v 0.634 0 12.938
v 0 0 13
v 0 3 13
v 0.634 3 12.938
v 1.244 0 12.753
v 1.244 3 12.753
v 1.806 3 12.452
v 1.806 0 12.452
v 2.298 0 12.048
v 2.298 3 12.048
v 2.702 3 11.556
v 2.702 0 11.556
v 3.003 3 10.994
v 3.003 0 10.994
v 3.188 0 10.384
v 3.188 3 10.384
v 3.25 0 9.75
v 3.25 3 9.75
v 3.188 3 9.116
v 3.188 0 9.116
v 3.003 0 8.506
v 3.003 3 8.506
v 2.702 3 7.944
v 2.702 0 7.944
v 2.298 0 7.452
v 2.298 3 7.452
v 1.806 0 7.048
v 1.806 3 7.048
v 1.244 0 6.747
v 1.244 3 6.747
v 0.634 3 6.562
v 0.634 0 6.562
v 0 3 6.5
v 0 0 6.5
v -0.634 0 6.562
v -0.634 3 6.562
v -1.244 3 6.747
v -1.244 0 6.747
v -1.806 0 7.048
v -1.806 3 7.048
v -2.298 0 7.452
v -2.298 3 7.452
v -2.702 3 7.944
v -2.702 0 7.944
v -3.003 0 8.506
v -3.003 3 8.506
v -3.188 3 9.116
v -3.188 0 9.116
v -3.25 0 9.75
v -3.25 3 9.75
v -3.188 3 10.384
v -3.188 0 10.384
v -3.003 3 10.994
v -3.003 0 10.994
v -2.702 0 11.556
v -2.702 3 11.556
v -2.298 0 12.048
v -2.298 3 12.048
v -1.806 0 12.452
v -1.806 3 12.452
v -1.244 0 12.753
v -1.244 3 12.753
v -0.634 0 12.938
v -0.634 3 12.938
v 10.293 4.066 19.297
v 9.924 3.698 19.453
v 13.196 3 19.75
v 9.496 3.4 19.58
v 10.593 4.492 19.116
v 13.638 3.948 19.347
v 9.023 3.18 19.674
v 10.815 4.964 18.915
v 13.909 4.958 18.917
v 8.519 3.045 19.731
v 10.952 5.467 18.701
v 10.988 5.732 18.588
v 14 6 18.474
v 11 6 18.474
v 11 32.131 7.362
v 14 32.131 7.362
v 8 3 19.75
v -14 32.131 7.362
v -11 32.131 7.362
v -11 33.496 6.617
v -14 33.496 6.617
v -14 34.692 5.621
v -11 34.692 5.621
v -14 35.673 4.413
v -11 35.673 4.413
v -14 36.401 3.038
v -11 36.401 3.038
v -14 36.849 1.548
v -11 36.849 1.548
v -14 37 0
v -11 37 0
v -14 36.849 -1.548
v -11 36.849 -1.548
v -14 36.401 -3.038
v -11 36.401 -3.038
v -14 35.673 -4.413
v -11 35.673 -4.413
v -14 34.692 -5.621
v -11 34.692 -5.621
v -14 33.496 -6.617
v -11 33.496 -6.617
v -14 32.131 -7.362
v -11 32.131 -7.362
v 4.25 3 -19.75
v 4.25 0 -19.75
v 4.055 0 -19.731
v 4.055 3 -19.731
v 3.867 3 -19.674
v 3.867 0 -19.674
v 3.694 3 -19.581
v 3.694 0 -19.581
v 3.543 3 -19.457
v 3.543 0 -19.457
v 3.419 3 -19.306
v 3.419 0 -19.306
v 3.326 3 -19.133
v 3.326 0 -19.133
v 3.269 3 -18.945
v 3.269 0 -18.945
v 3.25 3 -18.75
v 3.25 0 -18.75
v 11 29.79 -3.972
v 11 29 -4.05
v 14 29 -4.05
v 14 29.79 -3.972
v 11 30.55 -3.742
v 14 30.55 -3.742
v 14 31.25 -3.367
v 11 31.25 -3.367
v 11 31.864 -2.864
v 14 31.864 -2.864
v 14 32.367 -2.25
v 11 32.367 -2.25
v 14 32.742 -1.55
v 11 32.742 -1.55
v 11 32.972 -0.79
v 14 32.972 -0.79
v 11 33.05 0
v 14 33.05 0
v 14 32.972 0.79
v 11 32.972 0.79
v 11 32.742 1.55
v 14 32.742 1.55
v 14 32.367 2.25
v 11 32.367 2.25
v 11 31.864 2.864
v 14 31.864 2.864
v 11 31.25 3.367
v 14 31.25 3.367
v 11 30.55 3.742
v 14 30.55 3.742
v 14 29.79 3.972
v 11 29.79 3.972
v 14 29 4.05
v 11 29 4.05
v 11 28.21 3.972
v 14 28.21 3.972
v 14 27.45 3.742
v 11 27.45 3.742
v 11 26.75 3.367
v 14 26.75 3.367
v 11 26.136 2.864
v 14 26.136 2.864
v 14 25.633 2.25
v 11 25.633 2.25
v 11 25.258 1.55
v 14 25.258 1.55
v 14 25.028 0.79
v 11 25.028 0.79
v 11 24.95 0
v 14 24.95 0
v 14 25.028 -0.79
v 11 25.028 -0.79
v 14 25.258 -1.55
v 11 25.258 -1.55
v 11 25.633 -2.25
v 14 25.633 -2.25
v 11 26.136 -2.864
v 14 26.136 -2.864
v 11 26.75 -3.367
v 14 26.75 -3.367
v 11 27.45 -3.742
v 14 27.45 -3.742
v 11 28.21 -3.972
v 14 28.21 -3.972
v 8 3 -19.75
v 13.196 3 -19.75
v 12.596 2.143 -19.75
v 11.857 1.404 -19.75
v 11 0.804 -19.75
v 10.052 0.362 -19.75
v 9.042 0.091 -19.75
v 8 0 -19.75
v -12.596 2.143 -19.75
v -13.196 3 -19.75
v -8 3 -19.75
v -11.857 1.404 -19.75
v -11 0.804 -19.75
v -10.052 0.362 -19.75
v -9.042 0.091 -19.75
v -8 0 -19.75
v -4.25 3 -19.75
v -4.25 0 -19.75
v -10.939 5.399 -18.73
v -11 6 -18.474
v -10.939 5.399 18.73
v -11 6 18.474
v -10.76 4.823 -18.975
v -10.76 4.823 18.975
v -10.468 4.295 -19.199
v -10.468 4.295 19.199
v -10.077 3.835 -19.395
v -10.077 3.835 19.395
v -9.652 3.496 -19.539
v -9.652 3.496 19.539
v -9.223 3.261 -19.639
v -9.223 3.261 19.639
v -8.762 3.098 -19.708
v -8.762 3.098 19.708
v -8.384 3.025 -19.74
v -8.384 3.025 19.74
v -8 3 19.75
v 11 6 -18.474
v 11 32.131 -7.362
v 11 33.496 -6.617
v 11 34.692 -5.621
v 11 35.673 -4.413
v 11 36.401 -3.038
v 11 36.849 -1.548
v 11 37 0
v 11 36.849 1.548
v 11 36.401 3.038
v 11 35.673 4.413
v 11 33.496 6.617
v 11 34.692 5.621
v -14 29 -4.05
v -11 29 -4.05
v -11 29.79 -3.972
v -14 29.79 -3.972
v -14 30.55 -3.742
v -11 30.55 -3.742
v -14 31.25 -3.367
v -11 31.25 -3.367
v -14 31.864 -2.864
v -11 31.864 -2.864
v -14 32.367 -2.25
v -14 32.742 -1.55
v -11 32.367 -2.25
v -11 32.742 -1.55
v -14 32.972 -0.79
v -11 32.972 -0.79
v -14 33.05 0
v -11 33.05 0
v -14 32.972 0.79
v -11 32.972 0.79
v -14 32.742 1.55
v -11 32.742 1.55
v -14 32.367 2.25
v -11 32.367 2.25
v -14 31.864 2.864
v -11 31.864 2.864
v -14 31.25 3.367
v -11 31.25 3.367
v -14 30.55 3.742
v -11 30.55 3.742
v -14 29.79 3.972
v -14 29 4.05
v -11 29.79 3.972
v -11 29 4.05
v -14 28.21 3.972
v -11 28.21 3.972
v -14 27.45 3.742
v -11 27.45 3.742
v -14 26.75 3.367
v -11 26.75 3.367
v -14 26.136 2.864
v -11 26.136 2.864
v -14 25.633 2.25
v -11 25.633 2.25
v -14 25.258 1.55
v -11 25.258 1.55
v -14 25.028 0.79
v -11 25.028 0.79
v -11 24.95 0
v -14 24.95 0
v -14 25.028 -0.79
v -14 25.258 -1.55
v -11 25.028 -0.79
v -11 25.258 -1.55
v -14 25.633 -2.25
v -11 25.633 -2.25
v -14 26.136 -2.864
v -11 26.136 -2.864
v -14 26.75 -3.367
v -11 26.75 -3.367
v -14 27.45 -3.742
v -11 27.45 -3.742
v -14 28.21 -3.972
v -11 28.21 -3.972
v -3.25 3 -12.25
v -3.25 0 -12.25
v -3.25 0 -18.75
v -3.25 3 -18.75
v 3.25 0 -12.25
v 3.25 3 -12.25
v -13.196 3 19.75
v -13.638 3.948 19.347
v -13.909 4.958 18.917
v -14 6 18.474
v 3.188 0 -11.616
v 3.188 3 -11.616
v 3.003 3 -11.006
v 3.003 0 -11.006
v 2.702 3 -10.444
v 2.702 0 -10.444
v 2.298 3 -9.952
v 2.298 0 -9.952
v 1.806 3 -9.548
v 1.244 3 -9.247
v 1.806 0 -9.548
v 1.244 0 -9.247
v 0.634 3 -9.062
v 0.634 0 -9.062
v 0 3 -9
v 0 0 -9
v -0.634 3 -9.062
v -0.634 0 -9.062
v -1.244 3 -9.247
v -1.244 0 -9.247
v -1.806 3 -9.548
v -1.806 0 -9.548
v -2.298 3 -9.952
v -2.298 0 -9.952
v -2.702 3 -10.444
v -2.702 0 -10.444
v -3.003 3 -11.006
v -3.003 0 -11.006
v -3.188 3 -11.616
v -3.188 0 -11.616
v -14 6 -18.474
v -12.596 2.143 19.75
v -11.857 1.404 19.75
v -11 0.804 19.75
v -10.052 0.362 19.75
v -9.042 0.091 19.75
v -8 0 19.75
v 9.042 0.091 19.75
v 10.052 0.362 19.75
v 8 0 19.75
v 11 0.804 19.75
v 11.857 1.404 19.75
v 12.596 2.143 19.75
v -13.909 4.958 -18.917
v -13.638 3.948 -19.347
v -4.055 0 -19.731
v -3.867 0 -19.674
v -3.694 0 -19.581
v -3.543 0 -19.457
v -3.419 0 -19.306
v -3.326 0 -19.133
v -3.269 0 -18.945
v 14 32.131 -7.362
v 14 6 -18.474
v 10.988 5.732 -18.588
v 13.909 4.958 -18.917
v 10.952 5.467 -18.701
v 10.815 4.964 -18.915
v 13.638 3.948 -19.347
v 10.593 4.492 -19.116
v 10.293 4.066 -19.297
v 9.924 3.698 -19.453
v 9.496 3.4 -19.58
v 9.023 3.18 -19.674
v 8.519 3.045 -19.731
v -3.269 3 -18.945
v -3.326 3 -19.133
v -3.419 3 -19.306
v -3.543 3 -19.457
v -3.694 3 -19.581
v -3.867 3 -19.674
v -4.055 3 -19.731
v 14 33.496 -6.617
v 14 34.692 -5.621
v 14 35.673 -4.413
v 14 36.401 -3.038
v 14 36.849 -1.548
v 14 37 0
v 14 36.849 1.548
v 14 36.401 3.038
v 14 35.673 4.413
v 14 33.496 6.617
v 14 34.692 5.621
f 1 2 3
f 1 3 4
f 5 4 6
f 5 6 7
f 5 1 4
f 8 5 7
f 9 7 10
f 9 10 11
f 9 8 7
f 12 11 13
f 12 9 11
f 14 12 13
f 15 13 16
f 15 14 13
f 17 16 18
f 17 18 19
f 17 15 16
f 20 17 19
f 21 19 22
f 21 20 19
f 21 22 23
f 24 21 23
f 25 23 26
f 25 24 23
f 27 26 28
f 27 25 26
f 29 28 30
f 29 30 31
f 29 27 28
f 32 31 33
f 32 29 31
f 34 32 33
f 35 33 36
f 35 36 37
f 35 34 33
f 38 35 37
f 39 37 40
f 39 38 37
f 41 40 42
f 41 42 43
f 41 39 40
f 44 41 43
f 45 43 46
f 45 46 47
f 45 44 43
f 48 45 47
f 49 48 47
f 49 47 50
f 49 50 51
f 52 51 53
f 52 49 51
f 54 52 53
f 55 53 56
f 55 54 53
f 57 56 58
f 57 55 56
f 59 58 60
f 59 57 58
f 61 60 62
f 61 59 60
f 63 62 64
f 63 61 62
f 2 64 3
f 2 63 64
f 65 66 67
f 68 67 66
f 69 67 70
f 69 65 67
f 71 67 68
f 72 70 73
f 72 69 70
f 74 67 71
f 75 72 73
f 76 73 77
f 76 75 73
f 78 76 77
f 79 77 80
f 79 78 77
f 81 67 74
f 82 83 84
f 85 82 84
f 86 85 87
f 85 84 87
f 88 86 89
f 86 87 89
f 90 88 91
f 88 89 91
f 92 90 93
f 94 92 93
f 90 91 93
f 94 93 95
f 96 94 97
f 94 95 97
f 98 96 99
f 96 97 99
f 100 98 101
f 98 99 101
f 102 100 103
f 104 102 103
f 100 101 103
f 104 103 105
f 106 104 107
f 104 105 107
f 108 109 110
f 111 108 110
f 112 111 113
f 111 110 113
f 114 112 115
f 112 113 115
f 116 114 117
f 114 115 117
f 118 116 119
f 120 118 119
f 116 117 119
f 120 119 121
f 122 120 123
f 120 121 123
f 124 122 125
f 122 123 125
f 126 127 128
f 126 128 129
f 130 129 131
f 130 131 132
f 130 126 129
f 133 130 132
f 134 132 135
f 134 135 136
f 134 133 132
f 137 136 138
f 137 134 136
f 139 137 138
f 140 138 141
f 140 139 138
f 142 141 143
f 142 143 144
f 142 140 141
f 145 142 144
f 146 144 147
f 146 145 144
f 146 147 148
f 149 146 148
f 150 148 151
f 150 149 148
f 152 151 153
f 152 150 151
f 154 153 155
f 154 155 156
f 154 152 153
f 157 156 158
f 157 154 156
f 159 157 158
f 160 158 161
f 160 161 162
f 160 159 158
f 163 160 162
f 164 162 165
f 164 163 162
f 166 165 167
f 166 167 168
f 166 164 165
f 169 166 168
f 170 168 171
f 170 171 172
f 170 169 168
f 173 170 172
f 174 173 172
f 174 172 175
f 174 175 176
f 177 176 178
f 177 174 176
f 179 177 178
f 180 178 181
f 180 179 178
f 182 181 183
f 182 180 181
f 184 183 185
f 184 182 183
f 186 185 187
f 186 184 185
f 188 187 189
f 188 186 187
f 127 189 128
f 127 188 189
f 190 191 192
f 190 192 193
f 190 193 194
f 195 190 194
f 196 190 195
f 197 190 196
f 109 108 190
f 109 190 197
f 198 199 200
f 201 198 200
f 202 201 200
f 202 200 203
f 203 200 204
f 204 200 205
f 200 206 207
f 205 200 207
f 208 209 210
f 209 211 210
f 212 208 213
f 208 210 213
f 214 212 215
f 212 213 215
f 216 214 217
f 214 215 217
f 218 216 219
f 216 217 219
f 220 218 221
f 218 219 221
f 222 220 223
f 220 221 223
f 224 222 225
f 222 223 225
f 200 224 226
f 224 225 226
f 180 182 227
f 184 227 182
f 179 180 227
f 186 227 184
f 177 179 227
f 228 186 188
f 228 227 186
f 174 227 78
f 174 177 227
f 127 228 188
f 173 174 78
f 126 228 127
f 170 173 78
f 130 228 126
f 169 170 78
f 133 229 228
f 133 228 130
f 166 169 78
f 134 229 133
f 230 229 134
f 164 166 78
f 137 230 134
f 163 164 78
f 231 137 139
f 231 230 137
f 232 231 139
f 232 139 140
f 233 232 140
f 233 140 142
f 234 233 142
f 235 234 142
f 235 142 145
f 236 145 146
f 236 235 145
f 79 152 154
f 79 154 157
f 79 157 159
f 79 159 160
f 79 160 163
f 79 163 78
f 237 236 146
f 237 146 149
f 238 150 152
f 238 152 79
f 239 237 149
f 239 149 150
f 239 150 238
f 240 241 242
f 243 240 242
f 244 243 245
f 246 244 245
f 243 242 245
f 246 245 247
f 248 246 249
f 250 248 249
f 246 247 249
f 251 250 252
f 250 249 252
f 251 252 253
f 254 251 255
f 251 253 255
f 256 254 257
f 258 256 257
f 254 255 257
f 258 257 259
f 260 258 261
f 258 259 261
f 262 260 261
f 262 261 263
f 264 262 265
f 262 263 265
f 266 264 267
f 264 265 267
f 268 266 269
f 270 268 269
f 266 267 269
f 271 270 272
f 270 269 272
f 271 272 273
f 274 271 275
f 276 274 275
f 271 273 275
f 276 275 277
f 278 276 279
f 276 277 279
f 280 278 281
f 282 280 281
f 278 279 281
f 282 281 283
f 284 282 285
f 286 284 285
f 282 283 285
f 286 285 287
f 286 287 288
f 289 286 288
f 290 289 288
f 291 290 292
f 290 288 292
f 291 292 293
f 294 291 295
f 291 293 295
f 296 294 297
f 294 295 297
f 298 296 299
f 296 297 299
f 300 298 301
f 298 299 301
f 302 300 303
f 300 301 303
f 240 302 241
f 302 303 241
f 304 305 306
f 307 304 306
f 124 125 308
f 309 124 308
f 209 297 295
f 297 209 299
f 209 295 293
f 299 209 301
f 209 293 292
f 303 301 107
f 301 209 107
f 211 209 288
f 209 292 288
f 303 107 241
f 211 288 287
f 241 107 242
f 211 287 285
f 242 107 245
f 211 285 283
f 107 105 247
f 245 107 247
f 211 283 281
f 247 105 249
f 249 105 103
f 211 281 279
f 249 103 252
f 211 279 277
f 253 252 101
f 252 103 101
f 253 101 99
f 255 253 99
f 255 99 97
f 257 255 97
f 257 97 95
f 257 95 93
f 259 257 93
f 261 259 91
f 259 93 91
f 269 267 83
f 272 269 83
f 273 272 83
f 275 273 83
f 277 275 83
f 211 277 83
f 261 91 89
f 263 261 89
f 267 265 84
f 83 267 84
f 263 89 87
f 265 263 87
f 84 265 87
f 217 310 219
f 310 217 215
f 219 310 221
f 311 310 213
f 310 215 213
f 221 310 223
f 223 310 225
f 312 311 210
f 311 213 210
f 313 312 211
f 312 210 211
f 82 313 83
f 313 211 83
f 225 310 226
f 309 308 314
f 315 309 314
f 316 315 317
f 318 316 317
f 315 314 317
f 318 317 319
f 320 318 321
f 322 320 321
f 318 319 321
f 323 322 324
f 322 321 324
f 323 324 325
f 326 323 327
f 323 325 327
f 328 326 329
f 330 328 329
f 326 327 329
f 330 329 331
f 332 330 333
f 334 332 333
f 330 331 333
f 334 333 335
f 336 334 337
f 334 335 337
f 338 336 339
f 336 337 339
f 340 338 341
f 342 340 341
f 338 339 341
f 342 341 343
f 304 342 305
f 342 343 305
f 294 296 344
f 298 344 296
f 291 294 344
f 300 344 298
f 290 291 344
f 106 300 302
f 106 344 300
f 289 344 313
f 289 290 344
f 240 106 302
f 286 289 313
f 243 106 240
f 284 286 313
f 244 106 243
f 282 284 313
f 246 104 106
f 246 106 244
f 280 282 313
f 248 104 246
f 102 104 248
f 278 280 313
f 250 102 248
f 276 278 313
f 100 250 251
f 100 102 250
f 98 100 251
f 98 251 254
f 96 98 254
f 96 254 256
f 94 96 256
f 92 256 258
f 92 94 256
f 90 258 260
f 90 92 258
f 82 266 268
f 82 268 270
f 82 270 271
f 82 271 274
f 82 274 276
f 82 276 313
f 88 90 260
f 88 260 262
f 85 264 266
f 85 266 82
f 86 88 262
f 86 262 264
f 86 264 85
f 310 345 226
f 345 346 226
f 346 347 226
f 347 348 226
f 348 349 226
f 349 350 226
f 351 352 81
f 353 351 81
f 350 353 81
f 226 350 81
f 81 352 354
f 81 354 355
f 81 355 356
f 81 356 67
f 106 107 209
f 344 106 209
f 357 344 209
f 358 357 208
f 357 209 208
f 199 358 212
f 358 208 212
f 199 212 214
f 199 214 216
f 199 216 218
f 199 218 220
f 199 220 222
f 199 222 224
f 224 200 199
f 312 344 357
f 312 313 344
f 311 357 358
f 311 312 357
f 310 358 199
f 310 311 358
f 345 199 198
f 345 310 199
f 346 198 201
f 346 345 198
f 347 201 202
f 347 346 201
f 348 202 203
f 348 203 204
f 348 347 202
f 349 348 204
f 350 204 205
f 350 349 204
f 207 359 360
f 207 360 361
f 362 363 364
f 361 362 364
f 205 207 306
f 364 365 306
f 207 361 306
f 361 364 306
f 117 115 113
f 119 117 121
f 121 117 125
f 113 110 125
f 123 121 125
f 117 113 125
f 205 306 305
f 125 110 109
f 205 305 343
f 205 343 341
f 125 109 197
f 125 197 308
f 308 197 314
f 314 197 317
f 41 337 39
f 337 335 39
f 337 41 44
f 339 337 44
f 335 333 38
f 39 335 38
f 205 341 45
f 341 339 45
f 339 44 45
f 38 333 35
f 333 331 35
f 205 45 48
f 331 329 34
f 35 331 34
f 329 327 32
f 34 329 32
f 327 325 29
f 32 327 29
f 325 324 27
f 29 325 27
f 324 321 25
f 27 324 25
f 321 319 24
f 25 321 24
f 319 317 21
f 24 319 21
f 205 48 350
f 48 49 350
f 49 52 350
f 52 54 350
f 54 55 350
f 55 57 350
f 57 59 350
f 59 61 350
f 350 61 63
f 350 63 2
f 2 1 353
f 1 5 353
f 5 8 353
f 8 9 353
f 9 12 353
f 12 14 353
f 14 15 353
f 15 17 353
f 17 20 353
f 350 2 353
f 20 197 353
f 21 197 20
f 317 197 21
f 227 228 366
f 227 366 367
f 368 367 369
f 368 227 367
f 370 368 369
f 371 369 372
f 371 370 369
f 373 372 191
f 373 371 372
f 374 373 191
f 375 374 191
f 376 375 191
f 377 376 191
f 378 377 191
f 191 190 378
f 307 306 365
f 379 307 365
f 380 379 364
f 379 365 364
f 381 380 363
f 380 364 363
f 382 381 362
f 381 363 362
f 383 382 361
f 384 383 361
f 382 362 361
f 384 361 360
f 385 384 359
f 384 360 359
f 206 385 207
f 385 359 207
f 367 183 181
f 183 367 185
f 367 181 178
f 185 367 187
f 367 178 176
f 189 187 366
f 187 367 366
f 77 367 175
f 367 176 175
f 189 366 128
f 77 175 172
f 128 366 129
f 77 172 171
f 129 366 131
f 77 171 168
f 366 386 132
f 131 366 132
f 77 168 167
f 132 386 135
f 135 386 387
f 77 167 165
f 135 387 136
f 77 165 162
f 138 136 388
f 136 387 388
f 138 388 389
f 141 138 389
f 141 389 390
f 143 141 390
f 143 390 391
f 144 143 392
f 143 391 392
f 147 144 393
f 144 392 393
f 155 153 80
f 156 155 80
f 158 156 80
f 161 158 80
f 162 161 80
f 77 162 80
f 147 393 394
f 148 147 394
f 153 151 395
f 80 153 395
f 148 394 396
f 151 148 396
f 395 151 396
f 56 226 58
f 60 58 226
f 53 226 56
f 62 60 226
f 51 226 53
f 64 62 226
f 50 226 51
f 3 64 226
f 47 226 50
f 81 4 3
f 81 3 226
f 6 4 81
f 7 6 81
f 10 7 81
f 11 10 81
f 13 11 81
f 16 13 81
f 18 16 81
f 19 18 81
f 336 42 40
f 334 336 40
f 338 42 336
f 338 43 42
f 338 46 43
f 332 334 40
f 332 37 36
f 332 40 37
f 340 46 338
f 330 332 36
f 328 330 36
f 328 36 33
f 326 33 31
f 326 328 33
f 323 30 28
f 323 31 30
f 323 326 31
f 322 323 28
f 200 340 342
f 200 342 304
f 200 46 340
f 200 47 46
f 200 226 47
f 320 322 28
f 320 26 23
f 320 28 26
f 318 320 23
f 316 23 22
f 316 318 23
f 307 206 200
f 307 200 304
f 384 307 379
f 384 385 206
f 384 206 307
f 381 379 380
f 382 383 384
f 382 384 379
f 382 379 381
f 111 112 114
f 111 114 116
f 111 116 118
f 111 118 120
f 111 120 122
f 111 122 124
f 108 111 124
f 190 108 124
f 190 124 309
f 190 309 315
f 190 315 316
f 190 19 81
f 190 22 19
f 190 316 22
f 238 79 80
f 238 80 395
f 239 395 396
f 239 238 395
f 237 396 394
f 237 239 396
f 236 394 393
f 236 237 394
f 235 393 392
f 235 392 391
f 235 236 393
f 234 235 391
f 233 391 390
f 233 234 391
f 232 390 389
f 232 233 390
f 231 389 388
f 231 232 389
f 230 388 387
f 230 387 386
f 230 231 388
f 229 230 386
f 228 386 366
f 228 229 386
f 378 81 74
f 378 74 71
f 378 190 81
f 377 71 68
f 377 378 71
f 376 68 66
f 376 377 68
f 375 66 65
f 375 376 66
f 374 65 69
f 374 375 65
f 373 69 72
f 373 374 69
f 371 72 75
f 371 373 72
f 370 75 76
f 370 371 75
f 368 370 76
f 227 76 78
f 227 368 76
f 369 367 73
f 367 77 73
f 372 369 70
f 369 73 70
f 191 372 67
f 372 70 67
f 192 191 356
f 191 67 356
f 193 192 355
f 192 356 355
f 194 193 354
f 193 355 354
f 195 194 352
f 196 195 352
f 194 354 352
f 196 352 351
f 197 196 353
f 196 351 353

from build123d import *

# Parameters (mm, degrees)
SKETCH1_R           = 3.25
BOSS_EXTRUDE1_DEPTH = 3
SKETCH2_R           = 4.05
BOSS_EXTRUDE2_DEPTH = 3
FILLET1_R           = 6
FILLET2_R           = 3


with BuildPart() as part:
    # Sketch1 → Boss-Extrude1 (new body)
    with BuildSketch(Plane(origin=(0, 0, 0), x_dir=(1, 0, 0), z_dir=(0, 1, 0))):
        with BuildLine():
            Line((-11, -19.75), (11, -19.75))
            Line((11, -19.75), (11, 19.75))
            Line((11, 19.75), (4.25, 19.75))
            ThreePointArc((4.25, 19.75), (3.542893219, 19.457106781), (3.25, 18.75))
            Line((3.25, 18.75), (3.25, 12.25))
            ThreePointArc((3.25, 12.25), (0, 9), (-3.25, 12.25))
            Line((-3.25, 12.25), (-3.25, 18.75))
            ThreePointArc((-3.25, 18.75), (-3.542893219, 19.457106781), (-4.25, 19.75))
            Line((-4.25, 19.75), (-11, 19.75))
            Line((-11, 19.75), (-11, -19.75))
        make_face()
        with Locations(Location((0, -9.75, 0), (0, 0, 270))):
            Circle(SKETCH1_R, mode=Mode.SUBTRACT)
    extrude(amount=BOSS_EXTRUDE1_DEPTH)

    # Sketch2 → Boss-Extrude2 (add)
    with BuildSketch(Plane(origin=(11, 0, 0), x_dir=(0, 0, -1), z_dir=(1, 0, 0))):
        with BuildLine():
            Line((-19.75, 3), (-7.361967169, 32.130725061))
            ThreePointArc((-7.361967169, 32.130725061), (0, 37), (7.361967169, 32.130725061))
            Line((7.361967169, 32.130725061), (19.75, 3))
            Line((19.75, 3), (19.75, 0))
            Line((19.75, 0), (-19.75, 0))
            Line((-19.75, 0), (-19.75, 3))
        make_face()
        with Locations((0, 29)):
            Circle(SKETCH2_R, mode=Mode.SUBTRACT)
    boss_extrude2 = extrude(amount=BOSS_EXTRUDE2_DEPTH)

    # Mirror1: Boss-Extrude2 across plane
    add(boss_extrude2.mirror(Plane(origin=(0, 0, 0), x_dir=(0, 0, 1), z_dir=(1, 0, 0))))

    # Fillet1
    fillet1_edges = [part.edges().sort_by_distance(p)[0] for p in [
        (-14, 0, 0),
        (14, 0, 0),
    ]]
    fillet(fillet1_edges, radius=FILLET1_R)

    # Fillet2
    fillet2_edges = [part.edges().sort_by_distance(p)[0] for p in [
        (-11, 3, 0),
        (11, 3, 0),
    ]]
    fillet(fillet2_edges, radius=FILLET2_R)


solid = part.part
